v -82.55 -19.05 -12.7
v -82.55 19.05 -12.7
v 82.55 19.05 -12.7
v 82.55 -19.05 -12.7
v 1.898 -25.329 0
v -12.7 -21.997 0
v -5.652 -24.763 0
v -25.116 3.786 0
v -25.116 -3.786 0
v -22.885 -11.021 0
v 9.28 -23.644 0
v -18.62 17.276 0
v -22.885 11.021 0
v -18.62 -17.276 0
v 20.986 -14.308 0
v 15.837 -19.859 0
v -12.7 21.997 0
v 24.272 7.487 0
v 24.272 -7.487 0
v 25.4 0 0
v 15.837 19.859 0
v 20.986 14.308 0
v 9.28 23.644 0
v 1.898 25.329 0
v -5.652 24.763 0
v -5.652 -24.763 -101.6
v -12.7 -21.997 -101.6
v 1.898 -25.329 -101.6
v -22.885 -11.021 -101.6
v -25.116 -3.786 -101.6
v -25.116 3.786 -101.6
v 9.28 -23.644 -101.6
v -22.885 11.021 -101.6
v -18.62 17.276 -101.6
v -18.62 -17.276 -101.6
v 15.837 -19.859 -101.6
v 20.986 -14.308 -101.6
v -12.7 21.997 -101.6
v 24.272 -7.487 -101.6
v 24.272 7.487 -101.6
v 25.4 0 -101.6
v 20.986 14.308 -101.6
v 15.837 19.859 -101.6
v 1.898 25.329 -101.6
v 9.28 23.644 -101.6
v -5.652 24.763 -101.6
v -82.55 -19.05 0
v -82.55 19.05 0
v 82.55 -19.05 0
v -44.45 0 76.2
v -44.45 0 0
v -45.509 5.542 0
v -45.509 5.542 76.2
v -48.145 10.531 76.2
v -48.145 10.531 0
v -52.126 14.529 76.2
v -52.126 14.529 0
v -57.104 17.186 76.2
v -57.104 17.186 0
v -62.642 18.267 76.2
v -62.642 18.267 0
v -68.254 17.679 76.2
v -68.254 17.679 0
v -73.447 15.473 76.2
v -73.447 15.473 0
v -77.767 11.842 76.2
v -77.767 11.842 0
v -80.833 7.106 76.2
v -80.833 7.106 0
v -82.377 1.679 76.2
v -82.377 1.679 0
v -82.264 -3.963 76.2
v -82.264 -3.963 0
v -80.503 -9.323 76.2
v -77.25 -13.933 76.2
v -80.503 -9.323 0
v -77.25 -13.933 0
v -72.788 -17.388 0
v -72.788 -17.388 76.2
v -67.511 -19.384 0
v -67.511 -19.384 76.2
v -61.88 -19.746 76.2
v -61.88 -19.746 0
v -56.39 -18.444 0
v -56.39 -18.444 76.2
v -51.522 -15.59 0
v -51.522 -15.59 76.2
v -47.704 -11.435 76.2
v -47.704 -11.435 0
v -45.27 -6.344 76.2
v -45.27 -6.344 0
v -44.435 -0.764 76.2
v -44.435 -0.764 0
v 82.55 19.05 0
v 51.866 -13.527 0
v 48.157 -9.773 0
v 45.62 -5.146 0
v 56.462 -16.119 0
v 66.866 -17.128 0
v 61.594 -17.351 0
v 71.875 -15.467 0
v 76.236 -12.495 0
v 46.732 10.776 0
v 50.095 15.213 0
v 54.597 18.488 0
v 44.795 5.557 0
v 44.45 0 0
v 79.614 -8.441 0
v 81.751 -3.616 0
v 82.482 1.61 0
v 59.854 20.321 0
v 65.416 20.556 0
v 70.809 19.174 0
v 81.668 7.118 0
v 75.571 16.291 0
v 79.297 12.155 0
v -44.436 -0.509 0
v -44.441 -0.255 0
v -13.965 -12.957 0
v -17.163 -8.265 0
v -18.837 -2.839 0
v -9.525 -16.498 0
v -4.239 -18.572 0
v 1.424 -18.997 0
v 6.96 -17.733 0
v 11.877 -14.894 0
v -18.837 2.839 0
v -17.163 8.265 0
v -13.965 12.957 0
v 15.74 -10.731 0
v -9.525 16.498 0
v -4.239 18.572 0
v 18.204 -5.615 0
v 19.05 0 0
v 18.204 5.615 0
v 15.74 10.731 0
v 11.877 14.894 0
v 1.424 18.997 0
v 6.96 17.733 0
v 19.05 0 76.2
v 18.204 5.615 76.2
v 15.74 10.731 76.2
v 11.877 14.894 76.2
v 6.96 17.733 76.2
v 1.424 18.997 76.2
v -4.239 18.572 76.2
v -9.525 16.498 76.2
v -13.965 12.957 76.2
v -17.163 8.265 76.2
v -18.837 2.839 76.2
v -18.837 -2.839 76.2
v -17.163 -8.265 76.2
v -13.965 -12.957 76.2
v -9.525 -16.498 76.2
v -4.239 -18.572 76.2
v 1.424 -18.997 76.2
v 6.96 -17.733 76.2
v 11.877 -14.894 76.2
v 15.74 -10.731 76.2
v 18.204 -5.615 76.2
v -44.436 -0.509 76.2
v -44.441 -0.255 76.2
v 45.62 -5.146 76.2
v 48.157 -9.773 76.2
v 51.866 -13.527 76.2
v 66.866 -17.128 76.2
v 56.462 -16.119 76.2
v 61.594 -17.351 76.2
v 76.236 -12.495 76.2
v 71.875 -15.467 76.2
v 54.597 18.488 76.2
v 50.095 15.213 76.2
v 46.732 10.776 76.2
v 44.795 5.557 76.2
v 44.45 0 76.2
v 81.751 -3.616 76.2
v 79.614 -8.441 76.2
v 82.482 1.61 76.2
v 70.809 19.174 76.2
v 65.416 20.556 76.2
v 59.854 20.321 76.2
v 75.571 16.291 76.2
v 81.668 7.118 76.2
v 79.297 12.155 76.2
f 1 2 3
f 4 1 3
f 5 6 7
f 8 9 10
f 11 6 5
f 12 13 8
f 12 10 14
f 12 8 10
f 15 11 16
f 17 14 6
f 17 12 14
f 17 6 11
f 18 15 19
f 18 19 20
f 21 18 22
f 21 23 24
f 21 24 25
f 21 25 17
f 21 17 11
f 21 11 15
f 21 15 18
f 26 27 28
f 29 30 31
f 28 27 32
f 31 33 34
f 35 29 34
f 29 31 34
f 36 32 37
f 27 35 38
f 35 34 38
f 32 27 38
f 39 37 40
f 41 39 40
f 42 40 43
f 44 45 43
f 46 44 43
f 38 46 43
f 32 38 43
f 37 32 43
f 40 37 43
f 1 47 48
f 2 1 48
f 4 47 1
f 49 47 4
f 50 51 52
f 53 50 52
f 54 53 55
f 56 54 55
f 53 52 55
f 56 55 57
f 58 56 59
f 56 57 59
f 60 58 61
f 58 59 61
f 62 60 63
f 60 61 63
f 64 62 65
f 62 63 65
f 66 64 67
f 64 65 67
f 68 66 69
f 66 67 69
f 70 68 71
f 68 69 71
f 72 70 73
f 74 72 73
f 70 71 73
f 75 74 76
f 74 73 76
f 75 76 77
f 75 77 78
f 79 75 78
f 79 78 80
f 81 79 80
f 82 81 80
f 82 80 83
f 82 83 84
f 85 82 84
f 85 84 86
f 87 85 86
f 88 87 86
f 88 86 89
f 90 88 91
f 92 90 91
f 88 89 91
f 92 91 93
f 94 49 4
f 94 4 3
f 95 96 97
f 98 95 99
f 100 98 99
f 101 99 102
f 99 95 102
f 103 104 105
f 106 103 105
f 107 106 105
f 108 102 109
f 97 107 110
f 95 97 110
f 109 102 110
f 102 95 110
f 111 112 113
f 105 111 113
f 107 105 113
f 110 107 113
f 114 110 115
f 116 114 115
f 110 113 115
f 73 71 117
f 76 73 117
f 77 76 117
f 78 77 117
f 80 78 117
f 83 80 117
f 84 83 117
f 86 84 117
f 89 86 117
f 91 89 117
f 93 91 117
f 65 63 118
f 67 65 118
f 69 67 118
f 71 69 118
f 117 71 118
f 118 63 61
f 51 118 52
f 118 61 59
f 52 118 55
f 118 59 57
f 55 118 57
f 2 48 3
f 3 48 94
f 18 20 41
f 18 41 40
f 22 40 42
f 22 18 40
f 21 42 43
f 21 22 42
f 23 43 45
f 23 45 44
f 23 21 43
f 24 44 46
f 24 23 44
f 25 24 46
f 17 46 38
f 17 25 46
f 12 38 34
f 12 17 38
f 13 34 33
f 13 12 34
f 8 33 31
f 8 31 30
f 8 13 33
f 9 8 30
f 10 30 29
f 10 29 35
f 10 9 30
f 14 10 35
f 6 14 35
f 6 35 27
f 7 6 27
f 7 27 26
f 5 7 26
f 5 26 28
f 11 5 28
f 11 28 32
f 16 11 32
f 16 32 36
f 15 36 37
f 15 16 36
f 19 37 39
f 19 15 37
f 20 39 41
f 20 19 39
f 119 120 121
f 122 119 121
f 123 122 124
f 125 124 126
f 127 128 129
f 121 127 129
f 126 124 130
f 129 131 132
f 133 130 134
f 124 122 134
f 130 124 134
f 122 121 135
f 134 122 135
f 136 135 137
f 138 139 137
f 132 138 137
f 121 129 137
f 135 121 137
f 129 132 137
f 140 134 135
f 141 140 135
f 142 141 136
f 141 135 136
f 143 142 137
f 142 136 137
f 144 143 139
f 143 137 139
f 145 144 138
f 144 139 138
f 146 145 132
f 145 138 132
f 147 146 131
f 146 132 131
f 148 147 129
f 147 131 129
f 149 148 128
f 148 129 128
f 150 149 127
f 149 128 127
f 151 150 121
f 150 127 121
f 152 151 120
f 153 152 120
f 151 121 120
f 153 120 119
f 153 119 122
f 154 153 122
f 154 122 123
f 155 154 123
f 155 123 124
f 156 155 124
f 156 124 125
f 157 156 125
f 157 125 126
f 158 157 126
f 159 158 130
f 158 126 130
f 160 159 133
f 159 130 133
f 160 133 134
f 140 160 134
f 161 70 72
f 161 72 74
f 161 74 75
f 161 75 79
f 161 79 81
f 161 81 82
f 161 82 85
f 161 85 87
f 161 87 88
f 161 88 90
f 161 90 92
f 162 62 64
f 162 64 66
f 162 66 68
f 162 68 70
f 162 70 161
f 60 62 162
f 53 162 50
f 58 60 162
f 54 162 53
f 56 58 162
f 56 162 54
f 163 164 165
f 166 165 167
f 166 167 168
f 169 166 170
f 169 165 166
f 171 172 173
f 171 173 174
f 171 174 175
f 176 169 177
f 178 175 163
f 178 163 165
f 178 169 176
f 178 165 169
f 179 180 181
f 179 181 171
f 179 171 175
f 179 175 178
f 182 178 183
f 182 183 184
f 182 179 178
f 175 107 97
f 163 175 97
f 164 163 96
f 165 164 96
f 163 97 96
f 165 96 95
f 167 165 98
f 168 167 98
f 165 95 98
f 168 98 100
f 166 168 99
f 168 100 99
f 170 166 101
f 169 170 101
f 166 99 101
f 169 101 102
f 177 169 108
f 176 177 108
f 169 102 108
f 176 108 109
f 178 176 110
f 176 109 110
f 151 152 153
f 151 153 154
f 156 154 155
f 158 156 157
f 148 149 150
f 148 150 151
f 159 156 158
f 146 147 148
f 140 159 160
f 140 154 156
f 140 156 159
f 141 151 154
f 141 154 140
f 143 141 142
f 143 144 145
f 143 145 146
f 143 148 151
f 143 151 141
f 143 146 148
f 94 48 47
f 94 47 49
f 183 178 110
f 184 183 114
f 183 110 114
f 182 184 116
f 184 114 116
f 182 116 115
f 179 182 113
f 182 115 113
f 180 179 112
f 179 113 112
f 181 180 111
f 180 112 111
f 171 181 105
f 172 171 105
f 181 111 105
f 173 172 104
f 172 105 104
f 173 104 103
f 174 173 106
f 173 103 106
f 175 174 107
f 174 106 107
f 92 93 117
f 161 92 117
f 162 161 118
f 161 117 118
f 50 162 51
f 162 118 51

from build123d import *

# Parameters (mm, degrees)
F3_DEPTH = 76.2
F1_W     = 165.1
F1_H     = 38.1
F4_DEPTH = 12.7
F2_R     = 25.4
F5_DEPTH = 101.6


with BuildPart() as f3:
    # F0 (on Top) → F3 (new body)
    with BuildSketch(Plane.XY):
        with BuildLine():
            ThreePointArc((-19.05, 0), (0, -19.05), (19.05, 0))
            ThreePointArc((19.05, 0), (0, 19.05), (-19.05, 0))
        make_face()
        with BuildLine():
            ThreePointArc((-44.43467, -0.764096), (-44.438503, -0.381971), (-44.45, 0))
            ThreePointArc((-44.45, 0), (-82.530837, -1.146221), (-44.43467, -0.764096))
        make_face()
        with BuildLine():
            ThreePointArc((82.481836, 1.61009), (62.62607, 20.643041), (44.45, 0))
            ThreePointArc((44.45, 0), (64.237602, -17.422862), (82.481836, 1.61009))
        make_face()
    extrude(amount=F3_DEPTH)


with BuildPart() as f4:
    # F1 (on Top) → F4 (new body)
    with BuildSketch(Plane.XY):
        Rectangle(F1_W, F1_H)
    extrude(amount=-F4_DEPTH)


with BuildPart() as f5:
    # F2 (on Top) → F5 (new body)
    with BuildSketch(Plane.XY):
        Circle(F2_R)
    extrude(amount=-F5_DEPTH)


solid = Compound([f3.part, f4.part, f5.part])
